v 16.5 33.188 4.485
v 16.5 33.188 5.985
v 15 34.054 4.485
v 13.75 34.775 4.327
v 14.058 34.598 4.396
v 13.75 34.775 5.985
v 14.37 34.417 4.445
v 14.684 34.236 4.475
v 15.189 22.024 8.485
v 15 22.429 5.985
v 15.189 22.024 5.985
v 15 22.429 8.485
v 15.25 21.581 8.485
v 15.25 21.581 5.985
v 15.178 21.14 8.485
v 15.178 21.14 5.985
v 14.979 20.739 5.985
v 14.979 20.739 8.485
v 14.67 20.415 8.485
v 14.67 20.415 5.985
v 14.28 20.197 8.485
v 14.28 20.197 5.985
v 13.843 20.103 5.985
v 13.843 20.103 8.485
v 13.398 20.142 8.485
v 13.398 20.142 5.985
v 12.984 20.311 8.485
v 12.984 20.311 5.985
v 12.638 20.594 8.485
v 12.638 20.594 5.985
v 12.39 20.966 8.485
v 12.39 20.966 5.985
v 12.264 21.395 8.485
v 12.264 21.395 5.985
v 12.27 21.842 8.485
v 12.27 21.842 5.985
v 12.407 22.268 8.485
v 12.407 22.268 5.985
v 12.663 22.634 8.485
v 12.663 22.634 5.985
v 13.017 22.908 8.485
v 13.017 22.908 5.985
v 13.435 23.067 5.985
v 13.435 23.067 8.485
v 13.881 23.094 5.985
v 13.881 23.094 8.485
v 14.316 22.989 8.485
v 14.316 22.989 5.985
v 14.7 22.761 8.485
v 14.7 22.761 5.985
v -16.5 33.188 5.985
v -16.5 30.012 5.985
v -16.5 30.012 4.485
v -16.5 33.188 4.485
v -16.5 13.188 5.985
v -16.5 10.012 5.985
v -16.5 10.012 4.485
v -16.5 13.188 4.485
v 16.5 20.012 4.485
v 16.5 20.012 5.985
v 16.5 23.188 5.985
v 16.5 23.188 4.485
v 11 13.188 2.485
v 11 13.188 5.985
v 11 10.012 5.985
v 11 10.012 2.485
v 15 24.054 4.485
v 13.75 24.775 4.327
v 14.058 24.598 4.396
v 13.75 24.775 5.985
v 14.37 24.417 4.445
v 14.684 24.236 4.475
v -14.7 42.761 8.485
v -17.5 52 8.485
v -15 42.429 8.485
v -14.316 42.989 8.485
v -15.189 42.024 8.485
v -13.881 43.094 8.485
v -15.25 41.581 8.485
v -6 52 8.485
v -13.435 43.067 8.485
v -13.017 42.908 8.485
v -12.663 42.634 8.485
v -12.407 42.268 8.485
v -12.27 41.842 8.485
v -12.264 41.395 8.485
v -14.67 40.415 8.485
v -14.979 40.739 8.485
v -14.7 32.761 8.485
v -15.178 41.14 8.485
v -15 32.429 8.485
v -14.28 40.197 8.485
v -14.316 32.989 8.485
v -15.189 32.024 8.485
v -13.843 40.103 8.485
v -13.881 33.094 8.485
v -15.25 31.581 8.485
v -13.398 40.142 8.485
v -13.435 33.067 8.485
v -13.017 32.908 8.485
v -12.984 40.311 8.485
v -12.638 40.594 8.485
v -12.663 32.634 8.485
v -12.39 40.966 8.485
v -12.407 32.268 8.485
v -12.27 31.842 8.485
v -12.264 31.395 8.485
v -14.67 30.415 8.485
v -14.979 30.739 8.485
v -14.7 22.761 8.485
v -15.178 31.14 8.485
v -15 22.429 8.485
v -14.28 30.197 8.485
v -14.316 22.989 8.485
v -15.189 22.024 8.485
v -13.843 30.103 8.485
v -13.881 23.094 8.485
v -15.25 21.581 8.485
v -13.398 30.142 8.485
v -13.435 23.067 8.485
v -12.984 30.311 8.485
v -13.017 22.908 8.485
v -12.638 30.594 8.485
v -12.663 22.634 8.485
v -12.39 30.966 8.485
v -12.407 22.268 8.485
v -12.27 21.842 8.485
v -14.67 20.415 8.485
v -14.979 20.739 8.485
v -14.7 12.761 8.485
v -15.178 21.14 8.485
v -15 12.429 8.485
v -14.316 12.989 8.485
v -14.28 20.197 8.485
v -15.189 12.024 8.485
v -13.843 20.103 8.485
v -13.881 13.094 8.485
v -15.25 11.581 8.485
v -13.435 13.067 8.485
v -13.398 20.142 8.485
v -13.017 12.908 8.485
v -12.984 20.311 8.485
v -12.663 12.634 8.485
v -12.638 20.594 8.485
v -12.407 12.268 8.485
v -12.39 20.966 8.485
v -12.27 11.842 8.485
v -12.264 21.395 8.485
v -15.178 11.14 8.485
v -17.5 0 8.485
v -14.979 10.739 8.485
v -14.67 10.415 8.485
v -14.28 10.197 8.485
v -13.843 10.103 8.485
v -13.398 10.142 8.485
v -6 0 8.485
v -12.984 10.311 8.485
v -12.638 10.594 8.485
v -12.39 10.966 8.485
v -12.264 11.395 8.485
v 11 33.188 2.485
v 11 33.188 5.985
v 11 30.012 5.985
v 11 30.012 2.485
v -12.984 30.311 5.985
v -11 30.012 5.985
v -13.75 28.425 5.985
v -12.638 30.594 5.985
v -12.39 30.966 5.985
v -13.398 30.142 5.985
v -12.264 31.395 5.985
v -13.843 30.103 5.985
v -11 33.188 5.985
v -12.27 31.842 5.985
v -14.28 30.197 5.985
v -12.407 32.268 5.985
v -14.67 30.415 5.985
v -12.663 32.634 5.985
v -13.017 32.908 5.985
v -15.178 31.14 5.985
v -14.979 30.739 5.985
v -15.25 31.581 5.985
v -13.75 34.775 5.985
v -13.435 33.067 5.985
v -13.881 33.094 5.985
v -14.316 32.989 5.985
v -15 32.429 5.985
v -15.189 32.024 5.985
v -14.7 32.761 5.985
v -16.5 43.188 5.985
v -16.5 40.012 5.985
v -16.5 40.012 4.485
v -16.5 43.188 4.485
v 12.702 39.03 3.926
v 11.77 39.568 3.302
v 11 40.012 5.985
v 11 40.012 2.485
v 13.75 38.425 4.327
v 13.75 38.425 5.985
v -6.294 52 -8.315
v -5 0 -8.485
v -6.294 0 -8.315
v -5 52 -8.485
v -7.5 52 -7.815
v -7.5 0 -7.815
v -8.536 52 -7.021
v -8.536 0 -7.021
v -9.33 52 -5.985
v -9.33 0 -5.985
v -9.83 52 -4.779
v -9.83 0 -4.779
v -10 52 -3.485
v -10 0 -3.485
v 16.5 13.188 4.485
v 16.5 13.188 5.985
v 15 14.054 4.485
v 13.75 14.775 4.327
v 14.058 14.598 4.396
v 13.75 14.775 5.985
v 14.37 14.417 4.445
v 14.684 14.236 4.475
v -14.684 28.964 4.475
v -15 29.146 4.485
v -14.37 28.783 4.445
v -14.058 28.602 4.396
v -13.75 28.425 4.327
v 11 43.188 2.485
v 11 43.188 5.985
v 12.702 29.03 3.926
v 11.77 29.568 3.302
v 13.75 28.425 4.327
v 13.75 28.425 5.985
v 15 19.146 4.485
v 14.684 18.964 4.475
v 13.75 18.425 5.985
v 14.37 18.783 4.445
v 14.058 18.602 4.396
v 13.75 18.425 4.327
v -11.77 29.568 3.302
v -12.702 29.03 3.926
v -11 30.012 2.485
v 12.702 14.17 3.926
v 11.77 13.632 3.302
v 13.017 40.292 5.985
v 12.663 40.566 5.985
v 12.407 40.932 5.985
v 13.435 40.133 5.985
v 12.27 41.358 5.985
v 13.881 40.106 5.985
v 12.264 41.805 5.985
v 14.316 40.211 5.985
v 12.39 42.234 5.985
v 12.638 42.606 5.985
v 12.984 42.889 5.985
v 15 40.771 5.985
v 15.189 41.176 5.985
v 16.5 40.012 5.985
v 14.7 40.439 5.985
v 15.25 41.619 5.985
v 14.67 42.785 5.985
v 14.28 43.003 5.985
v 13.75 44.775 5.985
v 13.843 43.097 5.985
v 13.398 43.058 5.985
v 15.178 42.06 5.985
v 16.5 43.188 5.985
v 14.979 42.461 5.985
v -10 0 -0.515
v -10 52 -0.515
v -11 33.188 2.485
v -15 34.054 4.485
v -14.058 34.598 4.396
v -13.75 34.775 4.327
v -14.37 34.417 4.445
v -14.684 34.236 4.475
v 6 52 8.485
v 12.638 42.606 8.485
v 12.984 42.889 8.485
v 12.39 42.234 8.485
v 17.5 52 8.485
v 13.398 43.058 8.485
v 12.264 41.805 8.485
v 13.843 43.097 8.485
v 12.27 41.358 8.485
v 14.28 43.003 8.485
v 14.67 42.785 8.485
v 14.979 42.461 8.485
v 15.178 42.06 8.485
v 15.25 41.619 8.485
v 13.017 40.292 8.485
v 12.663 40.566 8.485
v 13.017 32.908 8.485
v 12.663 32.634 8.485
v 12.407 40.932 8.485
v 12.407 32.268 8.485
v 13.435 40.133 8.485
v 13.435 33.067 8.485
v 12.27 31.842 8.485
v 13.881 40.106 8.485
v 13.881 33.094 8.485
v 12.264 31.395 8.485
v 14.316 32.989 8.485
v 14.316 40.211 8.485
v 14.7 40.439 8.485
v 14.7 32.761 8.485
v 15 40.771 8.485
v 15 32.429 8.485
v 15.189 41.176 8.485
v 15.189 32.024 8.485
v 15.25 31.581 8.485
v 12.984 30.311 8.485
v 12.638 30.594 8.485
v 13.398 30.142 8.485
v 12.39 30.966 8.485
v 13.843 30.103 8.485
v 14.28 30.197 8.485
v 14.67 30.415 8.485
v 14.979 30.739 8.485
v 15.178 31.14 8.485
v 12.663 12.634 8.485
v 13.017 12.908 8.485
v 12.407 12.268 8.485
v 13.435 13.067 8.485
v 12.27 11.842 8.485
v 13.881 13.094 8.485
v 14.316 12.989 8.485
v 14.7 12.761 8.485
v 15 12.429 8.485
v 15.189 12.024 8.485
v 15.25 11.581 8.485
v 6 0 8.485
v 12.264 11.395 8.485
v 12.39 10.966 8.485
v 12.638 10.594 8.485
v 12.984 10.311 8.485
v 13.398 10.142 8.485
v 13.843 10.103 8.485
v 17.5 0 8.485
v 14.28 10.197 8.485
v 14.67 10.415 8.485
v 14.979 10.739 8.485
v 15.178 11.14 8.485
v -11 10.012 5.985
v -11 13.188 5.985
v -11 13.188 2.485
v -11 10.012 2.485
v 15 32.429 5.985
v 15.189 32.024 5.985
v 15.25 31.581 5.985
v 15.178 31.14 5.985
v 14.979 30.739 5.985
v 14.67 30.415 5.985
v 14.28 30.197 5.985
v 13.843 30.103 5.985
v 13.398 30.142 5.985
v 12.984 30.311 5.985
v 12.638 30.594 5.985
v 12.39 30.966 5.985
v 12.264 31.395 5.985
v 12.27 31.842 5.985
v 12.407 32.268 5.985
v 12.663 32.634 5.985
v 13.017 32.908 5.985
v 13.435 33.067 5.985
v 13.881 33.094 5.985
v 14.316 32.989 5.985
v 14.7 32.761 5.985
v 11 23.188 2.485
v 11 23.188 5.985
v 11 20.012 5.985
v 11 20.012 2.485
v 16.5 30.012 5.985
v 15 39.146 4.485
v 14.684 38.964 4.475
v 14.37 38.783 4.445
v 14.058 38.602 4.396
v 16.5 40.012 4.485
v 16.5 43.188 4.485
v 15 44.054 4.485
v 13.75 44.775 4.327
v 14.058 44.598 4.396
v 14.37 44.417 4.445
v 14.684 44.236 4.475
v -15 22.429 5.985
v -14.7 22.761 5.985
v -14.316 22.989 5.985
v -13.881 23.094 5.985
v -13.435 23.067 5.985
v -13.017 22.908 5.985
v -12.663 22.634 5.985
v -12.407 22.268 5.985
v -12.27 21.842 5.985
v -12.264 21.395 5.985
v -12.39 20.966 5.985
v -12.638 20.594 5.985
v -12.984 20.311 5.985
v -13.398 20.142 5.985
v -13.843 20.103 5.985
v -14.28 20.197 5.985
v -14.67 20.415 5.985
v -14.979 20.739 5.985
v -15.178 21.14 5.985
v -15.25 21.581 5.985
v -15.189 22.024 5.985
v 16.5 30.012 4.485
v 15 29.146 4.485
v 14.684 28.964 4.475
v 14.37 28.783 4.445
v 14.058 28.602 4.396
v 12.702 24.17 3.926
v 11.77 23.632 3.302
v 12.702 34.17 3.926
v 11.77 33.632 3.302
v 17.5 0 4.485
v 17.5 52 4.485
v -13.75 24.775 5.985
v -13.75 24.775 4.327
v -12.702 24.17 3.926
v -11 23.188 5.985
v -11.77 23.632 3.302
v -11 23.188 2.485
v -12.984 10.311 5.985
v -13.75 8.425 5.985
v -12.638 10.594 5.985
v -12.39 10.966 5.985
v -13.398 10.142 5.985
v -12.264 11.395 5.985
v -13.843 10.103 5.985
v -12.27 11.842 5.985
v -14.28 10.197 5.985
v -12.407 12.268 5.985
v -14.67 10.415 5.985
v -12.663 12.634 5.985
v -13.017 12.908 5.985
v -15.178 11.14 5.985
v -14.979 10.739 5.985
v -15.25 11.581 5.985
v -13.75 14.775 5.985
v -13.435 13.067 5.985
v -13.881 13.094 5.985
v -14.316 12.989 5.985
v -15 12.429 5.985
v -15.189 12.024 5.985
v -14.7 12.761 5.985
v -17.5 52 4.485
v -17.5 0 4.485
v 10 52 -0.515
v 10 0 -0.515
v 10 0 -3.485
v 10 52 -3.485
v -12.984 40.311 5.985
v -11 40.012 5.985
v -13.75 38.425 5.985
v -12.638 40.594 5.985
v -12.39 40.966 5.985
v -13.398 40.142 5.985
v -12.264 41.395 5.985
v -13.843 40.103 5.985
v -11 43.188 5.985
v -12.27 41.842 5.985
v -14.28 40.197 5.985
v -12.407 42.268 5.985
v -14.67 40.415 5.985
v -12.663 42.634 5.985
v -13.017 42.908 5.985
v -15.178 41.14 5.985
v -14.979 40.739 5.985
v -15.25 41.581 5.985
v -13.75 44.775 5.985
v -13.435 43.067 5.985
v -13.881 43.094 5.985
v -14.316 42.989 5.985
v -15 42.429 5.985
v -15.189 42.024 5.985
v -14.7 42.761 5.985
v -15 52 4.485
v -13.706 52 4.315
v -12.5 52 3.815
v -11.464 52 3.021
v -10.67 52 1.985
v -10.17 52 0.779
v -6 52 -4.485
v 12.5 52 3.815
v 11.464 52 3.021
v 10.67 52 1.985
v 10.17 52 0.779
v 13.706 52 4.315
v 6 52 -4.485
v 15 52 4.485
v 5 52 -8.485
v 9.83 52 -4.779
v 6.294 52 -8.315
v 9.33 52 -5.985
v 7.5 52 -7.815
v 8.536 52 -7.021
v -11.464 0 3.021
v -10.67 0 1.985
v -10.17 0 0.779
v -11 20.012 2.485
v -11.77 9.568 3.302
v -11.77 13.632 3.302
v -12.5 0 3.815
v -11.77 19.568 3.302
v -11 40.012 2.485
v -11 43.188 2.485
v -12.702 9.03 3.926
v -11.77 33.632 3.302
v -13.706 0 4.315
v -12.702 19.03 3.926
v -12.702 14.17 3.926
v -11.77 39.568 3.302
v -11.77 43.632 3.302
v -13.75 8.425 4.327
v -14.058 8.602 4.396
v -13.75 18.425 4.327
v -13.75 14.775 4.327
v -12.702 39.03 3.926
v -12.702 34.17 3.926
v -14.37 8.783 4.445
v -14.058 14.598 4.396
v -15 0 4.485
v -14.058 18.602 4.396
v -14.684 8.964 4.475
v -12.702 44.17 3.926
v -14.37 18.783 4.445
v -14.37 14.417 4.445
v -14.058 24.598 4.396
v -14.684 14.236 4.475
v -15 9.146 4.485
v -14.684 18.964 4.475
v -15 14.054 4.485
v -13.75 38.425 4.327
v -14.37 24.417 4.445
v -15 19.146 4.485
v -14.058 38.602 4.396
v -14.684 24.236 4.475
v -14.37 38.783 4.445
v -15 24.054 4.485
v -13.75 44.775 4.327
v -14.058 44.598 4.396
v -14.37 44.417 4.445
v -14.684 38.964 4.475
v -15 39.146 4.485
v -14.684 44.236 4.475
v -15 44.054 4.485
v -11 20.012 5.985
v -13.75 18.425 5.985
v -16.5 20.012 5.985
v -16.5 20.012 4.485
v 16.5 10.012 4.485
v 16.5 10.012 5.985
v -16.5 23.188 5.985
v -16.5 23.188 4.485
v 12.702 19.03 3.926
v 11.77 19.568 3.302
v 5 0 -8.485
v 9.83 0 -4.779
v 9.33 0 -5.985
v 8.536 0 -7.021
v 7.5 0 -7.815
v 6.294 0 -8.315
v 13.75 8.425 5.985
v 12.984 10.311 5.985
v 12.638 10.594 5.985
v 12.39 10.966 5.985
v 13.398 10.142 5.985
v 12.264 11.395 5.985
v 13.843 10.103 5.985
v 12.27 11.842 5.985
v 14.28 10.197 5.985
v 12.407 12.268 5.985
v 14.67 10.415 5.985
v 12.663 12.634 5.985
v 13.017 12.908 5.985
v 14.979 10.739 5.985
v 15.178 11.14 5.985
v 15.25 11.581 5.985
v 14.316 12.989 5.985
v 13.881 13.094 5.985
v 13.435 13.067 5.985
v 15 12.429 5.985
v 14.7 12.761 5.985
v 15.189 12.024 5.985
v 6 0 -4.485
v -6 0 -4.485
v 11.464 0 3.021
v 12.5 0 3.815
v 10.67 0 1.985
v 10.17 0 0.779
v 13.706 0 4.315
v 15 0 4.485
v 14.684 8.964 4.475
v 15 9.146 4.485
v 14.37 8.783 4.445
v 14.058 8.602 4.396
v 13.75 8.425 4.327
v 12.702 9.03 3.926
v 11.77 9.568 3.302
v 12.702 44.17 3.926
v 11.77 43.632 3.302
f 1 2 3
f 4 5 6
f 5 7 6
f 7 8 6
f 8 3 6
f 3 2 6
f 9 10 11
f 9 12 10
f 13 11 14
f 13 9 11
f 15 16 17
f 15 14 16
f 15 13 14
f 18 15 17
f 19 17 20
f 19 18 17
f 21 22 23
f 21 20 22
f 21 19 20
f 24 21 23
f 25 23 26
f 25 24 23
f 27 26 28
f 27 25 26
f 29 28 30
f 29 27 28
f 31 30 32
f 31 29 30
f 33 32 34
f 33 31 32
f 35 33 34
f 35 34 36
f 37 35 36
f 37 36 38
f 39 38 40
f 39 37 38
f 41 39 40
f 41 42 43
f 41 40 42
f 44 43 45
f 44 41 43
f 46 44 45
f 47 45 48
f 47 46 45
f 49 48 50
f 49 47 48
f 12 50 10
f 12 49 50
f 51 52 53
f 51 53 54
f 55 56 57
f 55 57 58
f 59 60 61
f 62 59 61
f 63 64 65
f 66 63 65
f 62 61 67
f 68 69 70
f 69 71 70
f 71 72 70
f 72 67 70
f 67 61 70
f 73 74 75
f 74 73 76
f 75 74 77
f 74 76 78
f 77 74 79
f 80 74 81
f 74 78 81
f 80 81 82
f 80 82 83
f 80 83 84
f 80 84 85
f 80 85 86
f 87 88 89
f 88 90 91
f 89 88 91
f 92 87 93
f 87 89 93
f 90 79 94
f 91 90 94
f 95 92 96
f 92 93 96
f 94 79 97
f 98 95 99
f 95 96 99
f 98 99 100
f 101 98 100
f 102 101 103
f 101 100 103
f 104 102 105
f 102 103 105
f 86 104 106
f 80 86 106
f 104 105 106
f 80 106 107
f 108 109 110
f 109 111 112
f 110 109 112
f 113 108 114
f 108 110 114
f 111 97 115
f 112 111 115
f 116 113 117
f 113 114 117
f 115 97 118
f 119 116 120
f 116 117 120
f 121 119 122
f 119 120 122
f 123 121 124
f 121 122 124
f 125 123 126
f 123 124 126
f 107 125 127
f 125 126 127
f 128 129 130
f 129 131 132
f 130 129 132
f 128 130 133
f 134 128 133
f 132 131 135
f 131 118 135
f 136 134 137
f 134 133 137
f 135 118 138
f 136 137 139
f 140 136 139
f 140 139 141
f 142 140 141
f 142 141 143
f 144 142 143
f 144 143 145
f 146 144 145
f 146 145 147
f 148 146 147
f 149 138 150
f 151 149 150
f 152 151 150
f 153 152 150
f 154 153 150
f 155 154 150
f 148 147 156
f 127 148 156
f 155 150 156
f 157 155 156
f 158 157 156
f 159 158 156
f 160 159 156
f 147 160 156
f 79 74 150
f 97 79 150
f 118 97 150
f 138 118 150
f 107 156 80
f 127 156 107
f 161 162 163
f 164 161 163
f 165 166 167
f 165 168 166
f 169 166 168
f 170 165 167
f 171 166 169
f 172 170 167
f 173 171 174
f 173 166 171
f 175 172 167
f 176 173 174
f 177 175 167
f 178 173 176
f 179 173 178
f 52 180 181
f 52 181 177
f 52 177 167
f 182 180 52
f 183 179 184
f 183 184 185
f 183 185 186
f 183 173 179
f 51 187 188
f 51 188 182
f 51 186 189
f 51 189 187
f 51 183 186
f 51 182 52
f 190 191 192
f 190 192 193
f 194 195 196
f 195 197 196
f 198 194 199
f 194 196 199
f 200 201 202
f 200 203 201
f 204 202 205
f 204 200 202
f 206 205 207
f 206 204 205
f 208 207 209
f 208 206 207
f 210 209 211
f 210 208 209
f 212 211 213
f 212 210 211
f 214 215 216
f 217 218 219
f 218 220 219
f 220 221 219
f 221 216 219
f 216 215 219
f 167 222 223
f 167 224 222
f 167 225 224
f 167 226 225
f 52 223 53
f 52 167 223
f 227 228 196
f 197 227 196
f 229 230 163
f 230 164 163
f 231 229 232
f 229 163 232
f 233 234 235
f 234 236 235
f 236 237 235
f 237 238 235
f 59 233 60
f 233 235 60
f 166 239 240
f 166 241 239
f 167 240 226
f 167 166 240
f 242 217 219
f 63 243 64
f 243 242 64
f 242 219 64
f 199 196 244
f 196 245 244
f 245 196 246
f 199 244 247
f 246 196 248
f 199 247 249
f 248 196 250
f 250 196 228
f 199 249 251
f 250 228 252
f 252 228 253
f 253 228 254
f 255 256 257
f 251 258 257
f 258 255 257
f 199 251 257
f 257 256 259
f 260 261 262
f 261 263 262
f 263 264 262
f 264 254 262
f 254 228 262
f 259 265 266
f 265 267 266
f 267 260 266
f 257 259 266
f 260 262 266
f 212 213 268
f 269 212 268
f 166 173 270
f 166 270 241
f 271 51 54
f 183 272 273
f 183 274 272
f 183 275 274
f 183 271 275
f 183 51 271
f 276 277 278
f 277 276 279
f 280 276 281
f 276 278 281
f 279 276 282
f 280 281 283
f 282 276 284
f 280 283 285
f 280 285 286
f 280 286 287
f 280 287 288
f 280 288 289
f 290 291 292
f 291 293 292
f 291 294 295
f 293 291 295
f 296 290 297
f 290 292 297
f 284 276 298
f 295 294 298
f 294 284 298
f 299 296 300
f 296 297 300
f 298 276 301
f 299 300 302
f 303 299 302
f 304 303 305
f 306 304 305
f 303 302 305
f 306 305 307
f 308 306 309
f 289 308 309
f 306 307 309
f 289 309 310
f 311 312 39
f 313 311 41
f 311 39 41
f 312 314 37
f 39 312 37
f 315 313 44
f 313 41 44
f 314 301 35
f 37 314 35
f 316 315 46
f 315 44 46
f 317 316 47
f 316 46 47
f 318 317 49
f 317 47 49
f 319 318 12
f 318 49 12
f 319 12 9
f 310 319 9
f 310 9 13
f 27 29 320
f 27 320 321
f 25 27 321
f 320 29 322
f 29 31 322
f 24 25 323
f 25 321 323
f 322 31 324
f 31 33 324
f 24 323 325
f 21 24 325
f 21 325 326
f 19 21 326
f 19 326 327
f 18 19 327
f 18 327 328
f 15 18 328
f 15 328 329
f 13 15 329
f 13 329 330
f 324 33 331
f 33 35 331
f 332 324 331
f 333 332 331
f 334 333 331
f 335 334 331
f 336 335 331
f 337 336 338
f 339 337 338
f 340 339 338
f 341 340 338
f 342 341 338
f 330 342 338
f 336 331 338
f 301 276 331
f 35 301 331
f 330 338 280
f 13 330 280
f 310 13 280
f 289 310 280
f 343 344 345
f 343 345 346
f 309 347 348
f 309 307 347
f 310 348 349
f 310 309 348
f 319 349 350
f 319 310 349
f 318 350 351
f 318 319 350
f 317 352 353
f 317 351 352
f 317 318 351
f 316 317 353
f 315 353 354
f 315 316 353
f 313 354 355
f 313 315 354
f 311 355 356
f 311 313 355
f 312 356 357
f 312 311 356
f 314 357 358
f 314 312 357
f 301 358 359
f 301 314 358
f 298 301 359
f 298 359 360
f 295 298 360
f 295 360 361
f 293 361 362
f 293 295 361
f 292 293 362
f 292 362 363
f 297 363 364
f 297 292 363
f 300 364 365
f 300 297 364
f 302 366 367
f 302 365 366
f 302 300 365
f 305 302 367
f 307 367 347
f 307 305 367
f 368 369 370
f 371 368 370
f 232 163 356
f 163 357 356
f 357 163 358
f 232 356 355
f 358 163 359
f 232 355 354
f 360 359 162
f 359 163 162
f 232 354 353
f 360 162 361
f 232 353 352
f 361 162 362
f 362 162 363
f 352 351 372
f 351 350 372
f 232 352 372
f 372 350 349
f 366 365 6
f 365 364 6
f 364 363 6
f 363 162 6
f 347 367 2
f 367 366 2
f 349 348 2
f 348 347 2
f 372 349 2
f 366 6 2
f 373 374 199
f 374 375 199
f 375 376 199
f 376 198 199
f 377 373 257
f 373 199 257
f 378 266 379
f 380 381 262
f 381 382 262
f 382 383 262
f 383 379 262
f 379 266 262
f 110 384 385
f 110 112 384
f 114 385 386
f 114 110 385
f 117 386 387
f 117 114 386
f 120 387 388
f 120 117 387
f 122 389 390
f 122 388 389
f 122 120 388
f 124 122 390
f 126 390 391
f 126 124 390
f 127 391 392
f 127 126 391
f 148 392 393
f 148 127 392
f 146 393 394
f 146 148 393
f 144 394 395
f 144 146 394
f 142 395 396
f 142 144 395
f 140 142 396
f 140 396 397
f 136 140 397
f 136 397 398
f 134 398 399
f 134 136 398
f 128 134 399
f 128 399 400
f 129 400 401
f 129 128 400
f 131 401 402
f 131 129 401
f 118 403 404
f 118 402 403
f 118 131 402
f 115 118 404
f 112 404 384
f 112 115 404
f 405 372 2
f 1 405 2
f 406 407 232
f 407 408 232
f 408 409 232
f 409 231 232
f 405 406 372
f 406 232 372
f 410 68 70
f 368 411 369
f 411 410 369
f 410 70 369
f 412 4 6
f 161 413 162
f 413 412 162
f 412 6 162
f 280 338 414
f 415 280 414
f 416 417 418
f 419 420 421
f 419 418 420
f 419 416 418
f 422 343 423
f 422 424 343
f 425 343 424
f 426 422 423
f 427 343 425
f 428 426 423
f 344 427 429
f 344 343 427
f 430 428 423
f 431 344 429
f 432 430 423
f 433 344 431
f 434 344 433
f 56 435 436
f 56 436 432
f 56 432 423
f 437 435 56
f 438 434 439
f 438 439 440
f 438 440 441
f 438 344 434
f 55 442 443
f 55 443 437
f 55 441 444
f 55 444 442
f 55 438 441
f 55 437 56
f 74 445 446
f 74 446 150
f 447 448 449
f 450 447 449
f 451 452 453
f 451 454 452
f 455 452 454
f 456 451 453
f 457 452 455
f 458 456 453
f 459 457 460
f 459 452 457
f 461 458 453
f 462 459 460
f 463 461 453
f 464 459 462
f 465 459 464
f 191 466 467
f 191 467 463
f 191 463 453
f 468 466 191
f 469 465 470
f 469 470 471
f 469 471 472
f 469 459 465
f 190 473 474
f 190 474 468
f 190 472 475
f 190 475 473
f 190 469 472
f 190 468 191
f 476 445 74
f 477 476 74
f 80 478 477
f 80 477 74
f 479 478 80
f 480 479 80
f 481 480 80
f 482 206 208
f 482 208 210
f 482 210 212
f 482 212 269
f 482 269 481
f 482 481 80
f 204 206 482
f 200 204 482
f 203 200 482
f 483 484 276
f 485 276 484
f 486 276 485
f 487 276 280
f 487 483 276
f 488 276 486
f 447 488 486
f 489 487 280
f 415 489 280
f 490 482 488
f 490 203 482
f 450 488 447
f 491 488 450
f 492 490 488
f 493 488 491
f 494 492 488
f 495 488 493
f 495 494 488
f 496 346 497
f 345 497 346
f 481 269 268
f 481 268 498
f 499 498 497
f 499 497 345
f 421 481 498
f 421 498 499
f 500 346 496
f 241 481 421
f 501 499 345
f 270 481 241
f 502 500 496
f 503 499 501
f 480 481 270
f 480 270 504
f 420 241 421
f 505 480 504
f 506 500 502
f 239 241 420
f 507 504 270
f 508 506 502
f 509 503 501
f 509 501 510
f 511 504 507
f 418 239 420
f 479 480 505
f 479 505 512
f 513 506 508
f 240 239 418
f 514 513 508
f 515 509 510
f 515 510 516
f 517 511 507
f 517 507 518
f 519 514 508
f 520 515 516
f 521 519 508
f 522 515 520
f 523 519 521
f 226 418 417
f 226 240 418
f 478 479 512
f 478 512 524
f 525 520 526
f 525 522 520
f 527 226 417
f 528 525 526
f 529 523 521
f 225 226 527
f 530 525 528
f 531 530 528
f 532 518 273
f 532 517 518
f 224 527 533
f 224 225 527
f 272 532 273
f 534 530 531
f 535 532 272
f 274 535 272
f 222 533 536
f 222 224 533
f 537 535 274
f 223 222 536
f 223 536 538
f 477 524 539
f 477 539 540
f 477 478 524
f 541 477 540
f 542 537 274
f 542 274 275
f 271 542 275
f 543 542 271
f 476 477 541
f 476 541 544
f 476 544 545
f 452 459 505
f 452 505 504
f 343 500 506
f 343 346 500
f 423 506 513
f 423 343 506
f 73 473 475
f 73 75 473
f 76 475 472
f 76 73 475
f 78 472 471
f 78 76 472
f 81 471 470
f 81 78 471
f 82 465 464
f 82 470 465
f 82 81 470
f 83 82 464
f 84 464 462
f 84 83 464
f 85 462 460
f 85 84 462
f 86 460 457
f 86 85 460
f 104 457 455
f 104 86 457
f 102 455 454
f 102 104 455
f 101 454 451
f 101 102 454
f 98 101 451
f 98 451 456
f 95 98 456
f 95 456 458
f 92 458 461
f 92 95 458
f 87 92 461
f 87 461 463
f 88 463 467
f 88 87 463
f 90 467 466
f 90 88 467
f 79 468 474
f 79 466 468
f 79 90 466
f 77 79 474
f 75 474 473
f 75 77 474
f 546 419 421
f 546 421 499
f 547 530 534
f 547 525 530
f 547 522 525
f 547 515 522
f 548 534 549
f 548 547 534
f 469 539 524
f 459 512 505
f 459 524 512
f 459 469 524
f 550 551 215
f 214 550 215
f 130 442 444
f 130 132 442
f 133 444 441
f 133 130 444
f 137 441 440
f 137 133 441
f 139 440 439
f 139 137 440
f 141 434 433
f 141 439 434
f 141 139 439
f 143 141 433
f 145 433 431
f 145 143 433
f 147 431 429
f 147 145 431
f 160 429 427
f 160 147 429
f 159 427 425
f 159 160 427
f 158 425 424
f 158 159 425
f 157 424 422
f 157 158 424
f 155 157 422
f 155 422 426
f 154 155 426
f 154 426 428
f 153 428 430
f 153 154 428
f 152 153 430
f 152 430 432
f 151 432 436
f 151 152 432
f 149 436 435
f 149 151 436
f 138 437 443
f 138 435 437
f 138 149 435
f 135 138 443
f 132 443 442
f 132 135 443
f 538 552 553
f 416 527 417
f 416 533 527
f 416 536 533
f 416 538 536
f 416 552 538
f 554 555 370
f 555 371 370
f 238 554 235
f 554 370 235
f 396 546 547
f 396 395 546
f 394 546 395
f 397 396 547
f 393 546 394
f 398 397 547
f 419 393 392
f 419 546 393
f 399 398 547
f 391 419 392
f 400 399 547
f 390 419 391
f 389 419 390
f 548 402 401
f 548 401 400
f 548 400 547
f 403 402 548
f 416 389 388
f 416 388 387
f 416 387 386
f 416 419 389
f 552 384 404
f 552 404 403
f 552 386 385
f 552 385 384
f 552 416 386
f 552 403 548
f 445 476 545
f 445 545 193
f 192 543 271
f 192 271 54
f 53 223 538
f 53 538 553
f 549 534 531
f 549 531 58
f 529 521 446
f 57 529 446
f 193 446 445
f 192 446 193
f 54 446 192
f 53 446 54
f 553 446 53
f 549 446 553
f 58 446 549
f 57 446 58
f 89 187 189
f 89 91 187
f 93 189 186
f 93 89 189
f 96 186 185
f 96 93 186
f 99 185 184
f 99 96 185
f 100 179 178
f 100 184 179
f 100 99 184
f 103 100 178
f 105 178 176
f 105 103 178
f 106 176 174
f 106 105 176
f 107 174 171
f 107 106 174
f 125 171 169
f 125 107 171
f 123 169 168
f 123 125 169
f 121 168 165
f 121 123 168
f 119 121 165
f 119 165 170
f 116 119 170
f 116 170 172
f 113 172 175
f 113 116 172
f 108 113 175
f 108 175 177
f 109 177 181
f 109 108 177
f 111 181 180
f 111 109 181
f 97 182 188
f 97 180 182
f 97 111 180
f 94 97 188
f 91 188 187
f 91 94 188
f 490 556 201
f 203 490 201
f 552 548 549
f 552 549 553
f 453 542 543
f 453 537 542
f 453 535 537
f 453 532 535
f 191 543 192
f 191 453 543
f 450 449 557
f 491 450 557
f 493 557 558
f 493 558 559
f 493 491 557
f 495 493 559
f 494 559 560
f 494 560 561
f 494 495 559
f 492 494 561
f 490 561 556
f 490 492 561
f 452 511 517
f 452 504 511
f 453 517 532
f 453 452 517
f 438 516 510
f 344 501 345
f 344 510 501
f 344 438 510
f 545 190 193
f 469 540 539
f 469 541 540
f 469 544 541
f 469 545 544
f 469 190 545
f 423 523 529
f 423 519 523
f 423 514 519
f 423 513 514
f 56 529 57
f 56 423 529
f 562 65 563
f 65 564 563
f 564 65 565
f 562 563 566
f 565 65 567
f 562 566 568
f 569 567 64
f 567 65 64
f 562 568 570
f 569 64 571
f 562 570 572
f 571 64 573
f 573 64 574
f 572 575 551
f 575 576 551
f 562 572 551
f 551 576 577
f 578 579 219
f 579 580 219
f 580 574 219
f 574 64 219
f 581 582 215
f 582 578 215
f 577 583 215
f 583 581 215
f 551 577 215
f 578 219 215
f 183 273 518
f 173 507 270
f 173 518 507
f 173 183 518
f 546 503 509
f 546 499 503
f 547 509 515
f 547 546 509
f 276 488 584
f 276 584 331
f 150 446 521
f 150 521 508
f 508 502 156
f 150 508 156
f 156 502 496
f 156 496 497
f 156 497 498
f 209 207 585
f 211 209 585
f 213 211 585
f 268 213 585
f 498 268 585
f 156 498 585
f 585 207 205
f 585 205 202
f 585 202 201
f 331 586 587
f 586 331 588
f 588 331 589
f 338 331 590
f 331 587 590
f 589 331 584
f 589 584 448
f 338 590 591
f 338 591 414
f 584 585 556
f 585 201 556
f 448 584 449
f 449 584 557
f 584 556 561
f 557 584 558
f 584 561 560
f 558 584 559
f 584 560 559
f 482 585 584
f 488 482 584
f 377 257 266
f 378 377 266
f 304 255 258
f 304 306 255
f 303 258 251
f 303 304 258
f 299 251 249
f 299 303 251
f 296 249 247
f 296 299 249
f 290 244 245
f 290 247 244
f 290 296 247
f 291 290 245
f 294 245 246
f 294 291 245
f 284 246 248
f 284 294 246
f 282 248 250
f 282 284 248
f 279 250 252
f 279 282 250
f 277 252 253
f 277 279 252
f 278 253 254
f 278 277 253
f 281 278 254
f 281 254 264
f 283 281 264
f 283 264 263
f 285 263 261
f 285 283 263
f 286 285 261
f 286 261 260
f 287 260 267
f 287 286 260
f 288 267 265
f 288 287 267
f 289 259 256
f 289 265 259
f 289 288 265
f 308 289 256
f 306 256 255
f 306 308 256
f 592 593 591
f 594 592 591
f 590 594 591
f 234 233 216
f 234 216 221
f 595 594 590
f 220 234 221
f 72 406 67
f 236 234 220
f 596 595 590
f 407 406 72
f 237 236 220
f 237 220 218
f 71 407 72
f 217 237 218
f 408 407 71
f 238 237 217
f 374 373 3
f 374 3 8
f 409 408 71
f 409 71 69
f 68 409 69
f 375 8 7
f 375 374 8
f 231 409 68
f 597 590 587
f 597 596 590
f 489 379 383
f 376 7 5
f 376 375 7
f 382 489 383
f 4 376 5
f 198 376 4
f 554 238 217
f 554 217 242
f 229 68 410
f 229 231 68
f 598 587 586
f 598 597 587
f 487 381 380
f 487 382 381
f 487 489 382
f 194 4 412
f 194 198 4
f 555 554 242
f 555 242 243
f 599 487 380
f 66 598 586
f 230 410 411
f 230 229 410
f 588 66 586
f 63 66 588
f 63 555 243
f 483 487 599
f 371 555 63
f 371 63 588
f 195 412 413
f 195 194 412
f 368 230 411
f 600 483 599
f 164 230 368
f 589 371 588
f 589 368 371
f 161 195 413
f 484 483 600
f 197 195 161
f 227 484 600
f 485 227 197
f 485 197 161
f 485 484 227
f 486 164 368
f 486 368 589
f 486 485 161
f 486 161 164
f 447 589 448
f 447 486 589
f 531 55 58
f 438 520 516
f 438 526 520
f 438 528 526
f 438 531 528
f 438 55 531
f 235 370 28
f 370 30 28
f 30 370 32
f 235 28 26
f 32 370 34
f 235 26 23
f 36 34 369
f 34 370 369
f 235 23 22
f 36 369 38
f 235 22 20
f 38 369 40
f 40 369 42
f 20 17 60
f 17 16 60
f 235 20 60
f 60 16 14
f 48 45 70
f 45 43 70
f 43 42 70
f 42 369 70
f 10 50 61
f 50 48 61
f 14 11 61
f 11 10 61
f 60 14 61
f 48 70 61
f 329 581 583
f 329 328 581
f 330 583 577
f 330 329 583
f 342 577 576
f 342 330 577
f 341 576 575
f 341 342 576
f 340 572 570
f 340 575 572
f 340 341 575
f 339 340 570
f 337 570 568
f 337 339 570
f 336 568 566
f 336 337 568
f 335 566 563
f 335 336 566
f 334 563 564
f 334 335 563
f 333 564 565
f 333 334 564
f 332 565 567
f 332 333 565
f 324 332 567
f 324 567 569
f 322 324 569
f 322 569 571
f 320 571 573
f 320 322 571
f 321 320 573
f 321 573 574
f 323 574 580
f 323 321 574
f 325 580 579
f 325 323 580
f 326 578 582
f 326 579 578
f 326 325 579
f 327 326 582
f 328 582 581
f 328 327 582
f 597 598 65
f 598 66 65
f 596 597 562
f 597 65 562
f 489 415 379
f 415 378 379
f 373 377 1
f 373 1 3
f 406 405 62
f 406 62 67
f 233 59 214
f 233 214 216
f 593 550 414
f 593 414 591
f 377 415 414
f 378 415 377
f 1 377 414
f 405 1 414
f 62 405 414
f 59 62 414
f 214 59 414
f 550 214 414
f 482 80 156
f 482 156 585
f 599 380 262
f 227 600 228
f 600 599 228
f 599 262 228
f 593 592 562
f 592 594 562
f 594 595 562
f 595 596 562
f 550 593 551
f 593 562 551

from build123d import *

# Parameters (mm, degrees)
EXTRUDE_1_DEPTH          = 52
FILLET_1_R               = 5
CUT_EXTRUDE_1_DEPTH      = 10
CUT_EXTRUDE_1_DEPTH_BACK = 10
SKETCH_2_R               = 1.5
CUT_EXTRUDE_2_DEPTH      = 10
CUT_EXTRUDE_2_DEPTH_BACK = 1.5


with BuildPart() as part:
    # Эскиз1 → Бобышка-Вытянуть1 (new body)
    with BuildSketch(Plane(origin=(0, 0, 0), x_dir=(1, 0, 0), z_dir=(0, 1, 0))):
        Polygon((-17.5, -4.485282754), (-17.5, -8.485282754), (-6, -8.485282754), (-6, 4.485282754), (6, 4.485282754), (6, -8.485282754), (17.5, -8.485282754), (17.5, -4.485282754), (10, -4.485282754), (10, 8.485282754), (-10, 8.485282754), (-10, -4.485282754), align=None)
    extrude(amount=EXTRUDE_1_DEPTH)

    # Скругление1
    fillet_1_edges = [part.edges().sort_by_distance(p)[0] for p in [
        (-10, 26, 4.485282754),
        (-10, 26, -8.485282754),
        (10, 26, -8.485282754),
        (10, 26, 4.485282754),
    ]]
    fillet(fillet_1_edges, radius=FILLET_1_R)

    # Эскиз2 → Вырез-Вытянуть1 (cut, two sides: drawn at the far end of the back side and taken through both)
    with BuildSketch(Plane(origin=(0, 0, 4.485282754), x_dir=(-1, 0, 0), z_dir=(0, 0, -1)).offset(-CUT_EXTRUDE_1_DEPTH_BACK)):
        with Locations(Location((13.75, 41.6, 0), (0, 0, 33.557309762))):
            Circle(SKETCH_2_R)
        with Locations(Location((13.75, 31.6, 0), (0, 0, 33.557309762))):
            Circle(SKETCH_2_R)
        with Locations(Location((13.75, 21.6, 0), (0, 0, 33.557309762))):
            Circle(SKETCH_2_R)
        with Locations(Location((13.75, 11.6, 0), (0, 0, 33.557309762))):
            Circle(SKETCH_2_R)
        with Locations(Location((-13.75, 41.6, 0), (0, 0, 213.557309762))):
            Circle(SKETCH_2_R)
        with Locations(Location((-13.75, 31.6, 0), (0, 0, 146.442690238))):
            Circle(SKETCH_2_R)
        with Locations(Location((-13.75, 21.6, 0), (0, 0, 146.442690238))):
            Circle(SKETCH_2_R)
        with Locations(Location((-13.75, 11.6, 0), (0, 0, 146.442690238))):
            Circle(SKETCH_2_R)
    extrude(amount=CUT_EXTRUDE_1_DEPTH + CUT_EXTRUDE_1_DEPTH_BACK, mode=Mode.SUBTRACT)

    # Эскиз3 → Вырез-Вытянуть2 (cut, two sides: drawn at the far end of the back side and taken through both)
    with BuildSketch(Plane(origin=(0, 0, 4.485282754), x_dir=(-1, 0, 0), z_dir=(0, 0, -1)).offset(-CUT_EXTRUDE_2_DEPTH_BACK)):
        Polygon((13.75, 38.424573519), (16.5, 40.01228676), (16.5, 43.18771324), (13.75, 44.775426481), (11, 43.18771324), (11, 40.01228676), align=None)
        Polygon((-11, 40.01228676), (-13.75, 38.424573519), (-16.5, 40.01228676), (-16.5, 43.18771324), (-13.75, 44.775426481), (-11, 43.18771324), align=None)
        Polygon((13.75, 28.424573519), (16.5, 30.01228676), (16.5, 33.18771324), (13.75, 34.775426481), (11, 33.18771324), (11, 30.01228676), align=None)
        Polygon((-11, 30.01228676), (-13.75, 28.424573519), (-16.5, 30.01228676), (-16.5, 33.18771324), (-13.75, 34.775426481), (-11, 33.18771324), align=None)
        Polygon((13.75, 18.424573519), (16.5, 20.01228676), (16.5, 23.18771324), (13.75, 24.775426481), (11, 23.18771324), (11, 20.01228676), align=None)
        Polygon((-11, 20.01228676), (-13.75, 18.424573519), (-16.5, 20.01228676), (-16.5, 23.18771324), (-13.75, 24.775426481), (-11, 23.18771324), align=None)
        Polygon((13.75, 8.424573519), (16.5, 10.01228676), (16.5, 13.18771324), (13.75, 14.775426481), (11, 13.18771324), (11, 10.01228676), align=None)
        Polygon((-11, 10.01228676), (-13.75, 8.424573519), (-16.5, 10.01228676), (-16.5, 13.18771324), (-13.75, 14.775426481), (-11, 13.18771324), align=None)
    extrude(amount=CUT_EXTRUDE_2_DEPTH + CUT_EXTRUDE_2_DEPTH_BACK, mode=Mode.SUBTRACT)


solid = part.part
